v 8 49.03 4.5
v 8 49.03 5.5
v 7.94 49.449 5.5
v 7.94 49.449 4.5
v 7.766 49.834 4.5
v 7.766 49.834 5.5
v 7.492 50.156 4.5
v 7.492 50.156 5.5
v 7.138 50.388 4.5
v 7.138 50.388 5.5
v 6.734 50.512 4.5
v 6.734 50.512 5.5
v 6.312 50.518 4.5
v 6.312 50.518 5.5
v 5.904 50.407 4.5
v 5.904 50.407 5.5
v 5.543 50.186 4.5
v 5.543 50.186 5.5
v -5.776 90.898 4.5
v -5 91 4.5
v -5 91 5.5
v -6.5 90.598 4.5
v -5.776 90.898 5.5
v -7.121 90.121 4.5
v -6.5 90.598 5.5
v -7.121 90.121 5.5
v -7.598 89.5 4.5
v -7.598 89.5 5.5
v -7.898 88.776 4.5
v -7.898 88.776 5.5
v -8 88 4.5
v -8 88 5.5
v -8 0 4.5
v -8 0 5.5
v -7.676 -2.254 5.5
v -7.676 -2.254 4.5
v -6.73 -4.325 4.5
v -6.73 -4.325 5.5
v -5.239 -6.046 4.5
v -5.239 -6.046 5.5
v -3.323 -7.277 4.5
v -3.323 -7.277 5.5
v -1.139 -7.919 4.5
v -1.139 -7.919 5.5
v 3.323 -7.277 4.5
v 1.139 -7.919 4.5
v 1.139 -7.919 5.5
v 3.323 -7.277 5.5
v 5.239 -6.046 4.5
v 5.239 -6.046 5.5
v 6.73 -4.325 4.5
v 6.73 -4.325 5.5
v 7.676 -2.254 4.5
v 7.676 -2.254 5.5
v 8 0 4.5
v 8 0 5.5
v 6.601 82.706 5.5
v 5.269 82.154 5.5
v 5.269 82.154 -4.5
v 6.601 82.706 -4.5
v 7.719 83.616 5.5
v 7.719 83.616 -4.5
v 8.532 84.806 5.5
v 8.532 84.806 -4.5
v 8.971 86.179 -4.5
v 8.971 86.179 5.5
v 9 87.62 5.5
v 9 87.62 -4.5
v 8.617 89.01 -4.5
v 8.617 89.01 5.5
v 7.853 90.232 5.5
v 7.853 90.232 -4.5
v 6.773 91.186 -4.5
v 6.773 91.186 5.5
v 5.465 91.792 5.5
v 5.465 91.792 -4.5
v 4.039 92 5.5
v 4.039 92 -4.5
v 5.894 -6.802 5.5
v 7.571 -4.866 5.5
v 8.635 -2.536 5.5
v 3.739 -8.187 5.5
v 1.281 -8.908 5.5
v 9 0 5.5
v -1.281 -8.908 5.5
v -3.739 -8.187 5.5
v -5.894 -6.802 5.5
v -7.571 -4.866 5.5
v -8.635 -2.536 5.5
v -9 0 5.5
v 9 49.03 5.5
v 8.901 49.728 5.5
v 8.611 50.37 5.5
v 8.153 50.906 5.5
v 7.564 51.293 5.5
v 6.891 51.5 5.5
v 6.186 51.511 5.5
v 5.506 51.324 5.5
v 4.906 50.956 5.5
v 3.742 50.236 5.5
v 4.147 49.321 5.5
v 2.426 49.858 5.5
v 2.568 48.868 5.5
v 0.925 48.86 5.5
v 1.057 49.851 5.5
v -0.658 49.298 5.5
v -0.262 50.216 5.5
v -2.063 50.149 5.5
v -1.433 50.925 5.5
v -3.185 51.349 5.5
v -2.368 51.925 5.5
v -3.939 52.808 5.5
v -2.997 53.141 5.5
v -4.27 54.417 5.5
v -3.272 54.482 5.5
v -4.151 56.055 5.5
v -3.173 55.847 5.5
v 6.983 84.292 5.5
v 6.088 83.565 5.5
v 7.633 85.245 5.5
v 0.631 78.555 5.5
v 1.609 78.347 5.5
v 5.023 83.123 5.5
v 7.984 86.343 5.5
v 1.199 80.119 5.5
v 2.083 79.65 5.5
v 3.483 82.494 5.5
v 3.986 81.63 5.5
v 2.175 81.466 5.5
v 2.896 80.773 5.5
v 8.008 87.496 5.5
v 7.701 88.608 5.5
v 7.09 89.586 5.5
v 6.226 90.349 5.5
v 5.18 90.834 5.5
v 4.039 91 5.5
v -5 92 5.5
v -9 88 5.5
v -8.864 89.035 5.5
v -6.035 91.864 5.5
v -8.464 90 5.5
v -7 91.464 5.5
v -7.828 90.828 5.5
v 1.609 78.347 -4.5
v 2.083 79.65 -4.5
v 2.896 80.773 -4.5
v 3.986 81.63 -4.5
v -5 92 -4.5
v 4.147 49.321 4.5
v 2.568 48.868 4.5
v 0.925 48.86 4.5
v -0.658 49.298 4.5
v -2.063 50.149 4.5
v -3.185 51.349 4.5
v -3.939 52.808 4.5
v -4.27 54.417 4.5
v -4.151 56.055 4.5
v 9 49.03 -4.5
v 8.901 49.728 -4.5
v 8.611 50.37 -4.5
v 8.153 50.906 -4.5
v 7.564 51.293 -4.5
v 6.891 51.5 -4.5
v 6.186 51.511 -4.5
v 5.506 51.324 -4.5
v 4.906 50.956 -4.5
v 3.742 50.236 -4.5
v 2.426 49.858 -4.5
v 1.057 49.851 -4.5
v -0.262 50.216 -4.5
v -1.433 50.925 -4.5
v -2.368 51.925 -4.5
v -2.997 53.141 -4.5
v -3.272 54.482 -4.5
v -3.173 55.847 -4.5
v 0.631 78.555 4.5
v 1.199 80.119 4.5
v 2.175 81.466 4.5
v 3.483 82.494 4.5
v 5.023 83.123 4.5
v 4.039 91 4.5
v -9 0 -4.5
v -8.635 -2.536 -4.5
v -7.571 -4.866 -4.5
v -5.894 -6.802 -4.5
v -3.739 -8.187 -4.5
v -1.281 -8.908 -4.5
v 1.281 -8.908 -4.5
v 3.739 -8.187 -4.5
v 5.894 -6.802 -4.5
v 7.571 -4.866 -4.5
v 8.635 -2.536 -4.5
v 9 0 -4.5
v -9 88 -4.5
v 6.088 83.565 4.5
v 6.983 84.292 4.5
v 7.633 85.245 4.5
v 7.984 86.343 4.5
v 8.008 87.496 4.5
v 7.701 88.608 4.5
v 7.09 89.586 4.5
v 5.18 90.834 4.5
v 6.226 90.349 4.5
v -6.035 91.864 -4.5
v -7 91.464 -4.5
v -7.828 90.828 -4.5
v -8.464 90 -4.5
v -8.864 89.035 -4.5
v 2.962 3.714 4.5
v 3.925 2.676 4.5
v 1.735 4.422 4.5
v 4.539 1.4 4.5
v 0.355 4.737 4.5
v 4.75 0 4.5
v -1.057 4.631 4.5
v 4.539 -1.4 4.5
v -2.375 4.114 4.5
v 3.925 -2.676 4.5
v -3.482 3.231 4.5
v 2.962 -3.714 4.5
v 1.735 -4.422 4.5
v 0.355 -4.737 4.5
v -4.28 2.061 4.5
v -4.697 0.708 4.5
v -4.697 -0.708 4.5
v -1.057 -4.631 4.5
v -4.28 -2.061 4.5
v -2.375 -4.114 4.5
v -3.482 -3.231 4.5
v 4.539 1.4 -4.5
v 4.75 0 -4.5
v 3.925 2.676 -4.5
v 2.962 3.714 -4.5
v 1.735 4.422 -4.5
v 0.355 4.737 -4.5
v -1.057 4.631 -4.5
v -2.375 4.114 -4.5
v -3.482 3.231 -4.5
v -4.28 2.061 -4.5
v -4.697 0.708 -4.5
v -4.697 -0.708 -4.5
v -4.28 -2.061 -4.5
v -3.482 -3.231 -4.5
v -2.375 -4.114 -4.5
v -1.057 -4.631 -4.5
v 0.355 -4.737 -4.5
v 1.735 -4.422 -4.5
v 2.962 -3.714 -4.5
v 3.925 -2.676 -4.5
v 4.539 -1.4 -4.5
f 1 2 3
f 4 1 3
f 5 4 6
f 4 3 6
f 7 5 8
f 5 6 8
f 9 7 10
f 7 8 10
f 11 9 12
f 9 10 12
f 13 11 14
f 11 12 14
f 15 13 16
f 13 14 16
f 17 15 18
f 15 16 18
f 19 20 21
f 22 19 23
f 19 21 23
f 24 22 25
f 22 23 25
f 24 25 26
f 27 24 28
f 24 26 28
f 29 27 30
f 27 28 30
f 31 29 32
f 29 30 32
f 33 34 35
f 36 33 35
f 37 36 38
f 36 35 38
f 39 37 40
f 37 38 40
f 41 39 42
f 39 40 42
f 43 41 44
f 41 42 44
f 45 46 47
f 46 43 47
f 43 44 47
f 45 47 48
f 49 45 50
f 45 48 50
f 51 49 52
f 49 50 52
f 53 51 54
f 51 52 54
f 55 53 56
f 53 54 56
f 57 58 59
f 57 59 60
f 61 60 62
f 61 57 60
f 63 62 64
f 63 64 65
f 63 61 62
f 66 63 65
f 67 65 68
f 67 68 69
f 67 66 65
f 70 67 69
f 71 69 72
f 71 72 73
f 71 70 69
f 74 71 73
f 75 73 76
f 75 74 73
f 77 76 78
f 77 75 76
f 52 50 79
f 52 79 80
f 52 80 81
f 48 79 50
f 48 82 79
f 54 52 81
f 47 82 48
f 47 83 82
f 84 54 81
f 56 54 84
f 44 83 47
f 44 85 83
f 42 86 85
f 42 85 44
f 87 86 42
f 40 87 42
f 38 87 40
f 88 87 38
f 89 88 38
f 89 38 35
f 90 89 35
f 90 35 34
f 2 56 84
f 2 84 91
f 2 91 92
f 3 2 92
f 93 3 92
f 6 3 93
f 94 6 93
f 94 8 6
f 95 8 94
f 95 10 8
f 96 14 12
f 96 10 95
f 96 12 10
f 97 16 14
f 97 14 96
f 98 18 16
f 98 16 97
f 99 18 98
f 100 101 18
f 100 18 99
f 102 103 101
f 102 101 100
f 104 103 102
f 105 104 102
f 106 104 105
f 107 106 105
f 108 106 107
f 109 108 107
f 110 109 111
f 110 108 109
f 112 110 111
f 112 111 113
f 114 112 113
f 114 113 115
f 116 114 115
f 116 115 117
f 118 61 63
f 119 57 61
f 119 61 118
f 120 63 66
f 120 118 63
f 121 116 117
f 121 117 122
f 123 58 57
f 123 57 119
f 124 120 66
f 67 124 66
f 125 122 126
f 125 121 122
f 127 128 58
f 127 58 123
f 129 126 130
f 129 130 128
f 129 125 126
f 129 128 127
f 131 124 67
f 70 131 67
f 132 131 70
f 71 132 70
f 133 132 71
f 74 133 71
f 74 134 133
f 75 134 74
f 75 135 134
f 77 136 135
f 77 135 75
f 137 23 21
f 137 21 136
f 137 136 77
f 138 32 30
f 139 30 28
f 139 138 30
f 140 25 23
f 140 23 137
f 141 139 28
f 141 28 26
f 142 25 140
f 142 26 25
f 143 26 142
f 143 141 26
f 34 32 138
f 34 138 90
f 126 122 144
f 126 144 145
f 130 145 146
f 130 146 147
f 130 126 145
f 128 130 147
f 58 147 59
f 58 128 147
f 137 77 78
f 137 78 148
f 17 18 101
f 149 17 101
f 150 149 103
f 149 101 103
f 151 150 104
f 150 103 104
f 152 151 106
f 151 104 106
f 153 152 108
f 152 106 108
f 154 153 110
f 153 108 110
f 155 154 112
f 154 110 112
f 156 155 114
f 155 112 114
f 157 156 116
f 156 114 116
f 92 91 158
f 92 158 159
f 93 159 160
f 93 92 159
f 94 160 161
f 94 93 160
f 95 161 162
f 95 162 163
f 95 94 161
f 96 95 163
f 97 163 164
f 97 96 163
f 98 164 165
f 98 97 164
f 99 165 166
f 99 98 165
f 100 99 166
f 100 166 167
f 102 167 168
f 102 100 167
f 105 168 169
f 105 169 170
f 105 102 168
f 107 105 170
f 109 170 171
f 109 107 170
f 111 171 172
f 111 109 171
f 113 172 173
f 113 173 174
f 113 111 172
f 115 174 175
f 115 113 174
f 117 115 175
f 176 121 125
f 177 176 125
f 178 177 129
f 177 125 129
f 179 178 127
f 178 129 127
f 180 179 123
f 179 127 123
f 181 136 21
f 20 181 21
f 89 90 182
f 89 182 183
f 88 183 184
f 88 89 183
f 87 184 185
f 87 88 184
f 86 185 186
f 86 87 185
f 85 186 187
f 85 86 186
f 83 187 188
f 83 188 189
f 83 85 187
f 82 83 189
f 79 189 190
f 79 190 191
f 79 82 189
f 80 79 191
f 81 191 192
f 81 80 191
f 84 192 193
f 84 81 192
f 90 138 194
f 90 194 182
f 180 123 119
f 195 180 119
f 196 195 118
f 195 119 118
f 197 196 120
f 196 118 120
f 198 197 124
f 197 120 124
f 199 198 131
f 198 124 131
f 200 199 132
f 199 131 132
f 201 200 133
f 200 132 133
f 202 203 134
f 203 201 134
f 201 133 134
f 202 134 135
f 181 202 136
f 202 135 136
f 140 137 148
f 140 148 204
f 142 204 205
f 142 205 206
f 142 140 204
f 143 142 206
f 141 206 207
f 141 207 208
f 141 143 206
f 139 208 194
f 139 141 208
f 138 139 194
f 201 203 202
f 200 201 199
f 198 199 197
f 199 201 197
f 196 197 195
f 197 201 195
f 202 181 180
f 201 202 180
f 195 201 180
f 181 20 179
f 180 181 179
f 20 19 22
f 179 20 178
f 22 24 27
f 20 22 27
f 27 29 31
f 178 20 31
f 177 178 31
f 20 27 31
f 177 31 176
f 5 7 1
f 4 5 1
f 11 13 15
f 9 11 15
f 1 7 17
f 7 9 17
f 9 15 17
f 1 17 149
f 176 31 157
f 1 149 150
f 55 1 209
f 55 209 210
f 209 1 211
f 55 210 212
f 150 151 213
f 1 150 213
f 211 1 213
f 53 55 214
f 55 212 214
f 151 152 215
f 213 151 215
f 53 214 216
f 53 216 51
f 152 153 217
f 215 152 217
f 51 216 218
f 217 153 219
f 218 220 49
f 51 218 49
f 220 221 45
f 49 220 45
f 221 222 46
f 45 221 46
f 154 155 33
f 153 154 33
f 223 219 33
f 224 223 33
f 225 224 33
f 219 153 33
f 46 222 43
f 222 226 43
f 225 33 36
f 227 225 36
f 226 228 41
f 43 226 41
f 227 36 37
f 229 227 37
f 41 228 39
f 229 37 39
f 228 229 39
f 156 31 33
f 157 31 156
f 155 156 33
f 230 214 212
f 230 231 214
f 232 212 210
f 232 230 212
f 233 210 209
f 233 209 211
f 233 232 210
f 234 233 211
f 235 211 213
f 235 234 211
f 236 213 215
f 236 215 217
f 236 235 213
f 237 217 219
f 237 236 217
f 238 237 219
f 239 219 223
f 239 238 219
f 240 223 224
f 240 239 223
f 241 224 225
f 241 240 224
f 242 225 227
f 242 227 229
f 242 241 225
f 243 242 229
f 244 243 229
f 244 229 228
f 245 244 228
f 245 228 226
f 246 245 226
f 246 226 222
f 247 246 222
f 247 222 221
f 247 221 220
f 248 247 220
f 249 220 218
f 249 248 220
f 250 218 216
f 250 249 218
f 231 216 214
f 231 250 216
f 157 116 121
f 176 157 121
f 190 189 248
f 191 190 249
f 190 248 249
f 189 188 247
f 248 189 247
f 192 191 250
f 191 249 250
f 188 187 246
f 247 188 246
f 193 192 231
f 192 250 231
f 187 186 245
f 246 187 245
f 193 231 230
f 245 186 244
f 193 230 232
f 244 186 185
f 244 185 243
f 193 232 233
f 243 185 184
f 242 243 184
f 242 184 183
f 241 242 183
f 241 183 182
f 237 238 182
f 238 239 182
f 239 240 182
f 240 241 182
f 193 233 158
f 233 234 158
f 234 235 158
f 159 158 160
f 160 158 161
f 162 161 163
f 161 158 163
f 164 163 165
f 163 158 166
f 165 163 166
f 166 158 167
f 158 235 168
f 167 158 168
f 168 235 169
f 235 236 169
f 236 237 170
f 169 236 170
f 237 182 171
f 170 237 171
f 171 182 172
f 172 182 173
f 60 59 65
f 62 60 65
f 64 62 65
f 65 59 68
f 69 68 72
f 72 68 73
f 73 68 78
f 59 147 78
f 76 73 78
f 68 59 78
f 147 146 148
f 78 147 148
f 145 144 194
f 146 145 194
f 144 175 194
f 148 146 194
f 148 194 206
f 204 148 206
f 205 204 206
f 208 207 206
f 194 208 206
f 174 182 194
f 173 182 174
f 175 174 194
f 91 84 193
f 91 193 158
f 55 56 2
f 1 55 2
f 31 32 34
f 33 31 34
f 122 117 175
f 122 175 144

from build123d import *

# Parameters (mm, degrees)
SKETCH2_R           = 4.75
BOSS_EXTRUDE2_DEPTH = 4.5
BOSS_EXTRUDE3_START = 5.5
BOSS_EXTRUDE3_DEPTH = 10


with BuildPart() as part:
    # Sketch2 → Boss-Extrude2 (new, symmetric)
    with BuildSketch(Plane(origin=(0, 0, 0), x_dir=(0, 1, 0), z_dir=(0, 0, 1))):
        with BuildLine():
            Line((0, 8), (88, 8))
            ThreePointArc((88, 8), (90.121320344, 7.121320344), (91, 5))
            Line((91, 5), (91, -4.038605995))
            ThreePointArc((91, -4.038605995), (87.49610936, -8.007721199), (83.123062249, -5.023163597))
            ThreePointArc((83.123062249, -5.023163597), (81.466210794, -2.174908223), (78.555125766, -0.631114396))
            Line((78.555125766, -0.631114396), (56.055125766, 4.151408242))
            ThreePointArc((56.055125766, 4.151408242), (49.674974507, 1.389866291), (50.185796102, -5.543495472))
            ThreePointArc((50.185796102, -5.543495472), (50.387673623, -7.138452508), (49.030331222, -8))
            Line((49.030331222, -8), (0, -8))
            ThreePointArc((0, -8), (-8, 0), (0, 8))
        make_face()
        with Locations(Location((0, 0, 0), (0, 0, 270))):
            Circle(SKETCH2_R, mode=Mode.SUBTRACT)
    extrude(amount=BOSS_EXTRUDE2_DEPTH, both=True)

    # Sketch2<4> → Boss-Extrude3 (add)
    with BuildSketch(Plane(origin=(0, 0, 0), x_dir=(0, 1, 0), z_dir=(0, 0, 1)).offset(BOSS_EXTRUDE3_START)):
        with BuildLine():
            ThreePointArc((78.347214076, -1.609261996), (80.773118265, -2.895756853), (82.153827811, -5.269302997))
            ThreePointArc((82.153827811, -5.269302997), (87.6201367, -9), (92, -4.038605995))
            Line((92, -4.038605995), (92, 5))
            ThreePointArc((92, 5), (90.828427125, 7.828427125), (88, 9))
            Line((88, 9), (0, 9))
            ThreePointArc((0, 9), (-9, 0), (0, -9))
            Line((0, -9), (49.030331222, -9))
            ThreePointArc((49.030331222, -9), (51.292568558, -7.564087513), (50.956106022, -4.905825787))
            ThreePointArc((50.956106022, -4.905825787), (50.53042136, 0.871975682), (55.847214076, 3.173260641))
            Line((55.847214076, 3.173260641), (78.347214076, -1.609261996))
        make_face()
        with BuildLine():
            ThreePointArc((0, 8), (-8, 0), (0, -8))
            Line((0, -8), (49.030331222, -8))
            ThreePointArc((49.030331222, -8), (50.387673623, -7.138452508), (50.185796102, -5.543495472))
            ThreePointArc((50.185796102, -5.543495472), (49.674974507, 1.389866291), (56.055125766, 4.151408242))
            Line((56.055125766, 4.151408242), (78.555125766, -0.631114396))
            ThreePointArc((78.555125766, -0.631114396), (81.466210794, -2.174908223), (83.123062249, -5.023163597))
            ThreePointArc((83.123062249, -5.023163597), (87.49610936, -8.007721199), (91, -4.038605995))
            Line((91, -4.038605995), (91, 5))
            ThreePointArc((91, 5), (90.121320344, 7.121320344), (88, 8))
            Line((88, 8), (0, 8))
        make_face(mode=Mode.SUBTRACT)
    extrude(amount=-BOSS_EXTRUDE3_DEPTH)


solid = part.part
